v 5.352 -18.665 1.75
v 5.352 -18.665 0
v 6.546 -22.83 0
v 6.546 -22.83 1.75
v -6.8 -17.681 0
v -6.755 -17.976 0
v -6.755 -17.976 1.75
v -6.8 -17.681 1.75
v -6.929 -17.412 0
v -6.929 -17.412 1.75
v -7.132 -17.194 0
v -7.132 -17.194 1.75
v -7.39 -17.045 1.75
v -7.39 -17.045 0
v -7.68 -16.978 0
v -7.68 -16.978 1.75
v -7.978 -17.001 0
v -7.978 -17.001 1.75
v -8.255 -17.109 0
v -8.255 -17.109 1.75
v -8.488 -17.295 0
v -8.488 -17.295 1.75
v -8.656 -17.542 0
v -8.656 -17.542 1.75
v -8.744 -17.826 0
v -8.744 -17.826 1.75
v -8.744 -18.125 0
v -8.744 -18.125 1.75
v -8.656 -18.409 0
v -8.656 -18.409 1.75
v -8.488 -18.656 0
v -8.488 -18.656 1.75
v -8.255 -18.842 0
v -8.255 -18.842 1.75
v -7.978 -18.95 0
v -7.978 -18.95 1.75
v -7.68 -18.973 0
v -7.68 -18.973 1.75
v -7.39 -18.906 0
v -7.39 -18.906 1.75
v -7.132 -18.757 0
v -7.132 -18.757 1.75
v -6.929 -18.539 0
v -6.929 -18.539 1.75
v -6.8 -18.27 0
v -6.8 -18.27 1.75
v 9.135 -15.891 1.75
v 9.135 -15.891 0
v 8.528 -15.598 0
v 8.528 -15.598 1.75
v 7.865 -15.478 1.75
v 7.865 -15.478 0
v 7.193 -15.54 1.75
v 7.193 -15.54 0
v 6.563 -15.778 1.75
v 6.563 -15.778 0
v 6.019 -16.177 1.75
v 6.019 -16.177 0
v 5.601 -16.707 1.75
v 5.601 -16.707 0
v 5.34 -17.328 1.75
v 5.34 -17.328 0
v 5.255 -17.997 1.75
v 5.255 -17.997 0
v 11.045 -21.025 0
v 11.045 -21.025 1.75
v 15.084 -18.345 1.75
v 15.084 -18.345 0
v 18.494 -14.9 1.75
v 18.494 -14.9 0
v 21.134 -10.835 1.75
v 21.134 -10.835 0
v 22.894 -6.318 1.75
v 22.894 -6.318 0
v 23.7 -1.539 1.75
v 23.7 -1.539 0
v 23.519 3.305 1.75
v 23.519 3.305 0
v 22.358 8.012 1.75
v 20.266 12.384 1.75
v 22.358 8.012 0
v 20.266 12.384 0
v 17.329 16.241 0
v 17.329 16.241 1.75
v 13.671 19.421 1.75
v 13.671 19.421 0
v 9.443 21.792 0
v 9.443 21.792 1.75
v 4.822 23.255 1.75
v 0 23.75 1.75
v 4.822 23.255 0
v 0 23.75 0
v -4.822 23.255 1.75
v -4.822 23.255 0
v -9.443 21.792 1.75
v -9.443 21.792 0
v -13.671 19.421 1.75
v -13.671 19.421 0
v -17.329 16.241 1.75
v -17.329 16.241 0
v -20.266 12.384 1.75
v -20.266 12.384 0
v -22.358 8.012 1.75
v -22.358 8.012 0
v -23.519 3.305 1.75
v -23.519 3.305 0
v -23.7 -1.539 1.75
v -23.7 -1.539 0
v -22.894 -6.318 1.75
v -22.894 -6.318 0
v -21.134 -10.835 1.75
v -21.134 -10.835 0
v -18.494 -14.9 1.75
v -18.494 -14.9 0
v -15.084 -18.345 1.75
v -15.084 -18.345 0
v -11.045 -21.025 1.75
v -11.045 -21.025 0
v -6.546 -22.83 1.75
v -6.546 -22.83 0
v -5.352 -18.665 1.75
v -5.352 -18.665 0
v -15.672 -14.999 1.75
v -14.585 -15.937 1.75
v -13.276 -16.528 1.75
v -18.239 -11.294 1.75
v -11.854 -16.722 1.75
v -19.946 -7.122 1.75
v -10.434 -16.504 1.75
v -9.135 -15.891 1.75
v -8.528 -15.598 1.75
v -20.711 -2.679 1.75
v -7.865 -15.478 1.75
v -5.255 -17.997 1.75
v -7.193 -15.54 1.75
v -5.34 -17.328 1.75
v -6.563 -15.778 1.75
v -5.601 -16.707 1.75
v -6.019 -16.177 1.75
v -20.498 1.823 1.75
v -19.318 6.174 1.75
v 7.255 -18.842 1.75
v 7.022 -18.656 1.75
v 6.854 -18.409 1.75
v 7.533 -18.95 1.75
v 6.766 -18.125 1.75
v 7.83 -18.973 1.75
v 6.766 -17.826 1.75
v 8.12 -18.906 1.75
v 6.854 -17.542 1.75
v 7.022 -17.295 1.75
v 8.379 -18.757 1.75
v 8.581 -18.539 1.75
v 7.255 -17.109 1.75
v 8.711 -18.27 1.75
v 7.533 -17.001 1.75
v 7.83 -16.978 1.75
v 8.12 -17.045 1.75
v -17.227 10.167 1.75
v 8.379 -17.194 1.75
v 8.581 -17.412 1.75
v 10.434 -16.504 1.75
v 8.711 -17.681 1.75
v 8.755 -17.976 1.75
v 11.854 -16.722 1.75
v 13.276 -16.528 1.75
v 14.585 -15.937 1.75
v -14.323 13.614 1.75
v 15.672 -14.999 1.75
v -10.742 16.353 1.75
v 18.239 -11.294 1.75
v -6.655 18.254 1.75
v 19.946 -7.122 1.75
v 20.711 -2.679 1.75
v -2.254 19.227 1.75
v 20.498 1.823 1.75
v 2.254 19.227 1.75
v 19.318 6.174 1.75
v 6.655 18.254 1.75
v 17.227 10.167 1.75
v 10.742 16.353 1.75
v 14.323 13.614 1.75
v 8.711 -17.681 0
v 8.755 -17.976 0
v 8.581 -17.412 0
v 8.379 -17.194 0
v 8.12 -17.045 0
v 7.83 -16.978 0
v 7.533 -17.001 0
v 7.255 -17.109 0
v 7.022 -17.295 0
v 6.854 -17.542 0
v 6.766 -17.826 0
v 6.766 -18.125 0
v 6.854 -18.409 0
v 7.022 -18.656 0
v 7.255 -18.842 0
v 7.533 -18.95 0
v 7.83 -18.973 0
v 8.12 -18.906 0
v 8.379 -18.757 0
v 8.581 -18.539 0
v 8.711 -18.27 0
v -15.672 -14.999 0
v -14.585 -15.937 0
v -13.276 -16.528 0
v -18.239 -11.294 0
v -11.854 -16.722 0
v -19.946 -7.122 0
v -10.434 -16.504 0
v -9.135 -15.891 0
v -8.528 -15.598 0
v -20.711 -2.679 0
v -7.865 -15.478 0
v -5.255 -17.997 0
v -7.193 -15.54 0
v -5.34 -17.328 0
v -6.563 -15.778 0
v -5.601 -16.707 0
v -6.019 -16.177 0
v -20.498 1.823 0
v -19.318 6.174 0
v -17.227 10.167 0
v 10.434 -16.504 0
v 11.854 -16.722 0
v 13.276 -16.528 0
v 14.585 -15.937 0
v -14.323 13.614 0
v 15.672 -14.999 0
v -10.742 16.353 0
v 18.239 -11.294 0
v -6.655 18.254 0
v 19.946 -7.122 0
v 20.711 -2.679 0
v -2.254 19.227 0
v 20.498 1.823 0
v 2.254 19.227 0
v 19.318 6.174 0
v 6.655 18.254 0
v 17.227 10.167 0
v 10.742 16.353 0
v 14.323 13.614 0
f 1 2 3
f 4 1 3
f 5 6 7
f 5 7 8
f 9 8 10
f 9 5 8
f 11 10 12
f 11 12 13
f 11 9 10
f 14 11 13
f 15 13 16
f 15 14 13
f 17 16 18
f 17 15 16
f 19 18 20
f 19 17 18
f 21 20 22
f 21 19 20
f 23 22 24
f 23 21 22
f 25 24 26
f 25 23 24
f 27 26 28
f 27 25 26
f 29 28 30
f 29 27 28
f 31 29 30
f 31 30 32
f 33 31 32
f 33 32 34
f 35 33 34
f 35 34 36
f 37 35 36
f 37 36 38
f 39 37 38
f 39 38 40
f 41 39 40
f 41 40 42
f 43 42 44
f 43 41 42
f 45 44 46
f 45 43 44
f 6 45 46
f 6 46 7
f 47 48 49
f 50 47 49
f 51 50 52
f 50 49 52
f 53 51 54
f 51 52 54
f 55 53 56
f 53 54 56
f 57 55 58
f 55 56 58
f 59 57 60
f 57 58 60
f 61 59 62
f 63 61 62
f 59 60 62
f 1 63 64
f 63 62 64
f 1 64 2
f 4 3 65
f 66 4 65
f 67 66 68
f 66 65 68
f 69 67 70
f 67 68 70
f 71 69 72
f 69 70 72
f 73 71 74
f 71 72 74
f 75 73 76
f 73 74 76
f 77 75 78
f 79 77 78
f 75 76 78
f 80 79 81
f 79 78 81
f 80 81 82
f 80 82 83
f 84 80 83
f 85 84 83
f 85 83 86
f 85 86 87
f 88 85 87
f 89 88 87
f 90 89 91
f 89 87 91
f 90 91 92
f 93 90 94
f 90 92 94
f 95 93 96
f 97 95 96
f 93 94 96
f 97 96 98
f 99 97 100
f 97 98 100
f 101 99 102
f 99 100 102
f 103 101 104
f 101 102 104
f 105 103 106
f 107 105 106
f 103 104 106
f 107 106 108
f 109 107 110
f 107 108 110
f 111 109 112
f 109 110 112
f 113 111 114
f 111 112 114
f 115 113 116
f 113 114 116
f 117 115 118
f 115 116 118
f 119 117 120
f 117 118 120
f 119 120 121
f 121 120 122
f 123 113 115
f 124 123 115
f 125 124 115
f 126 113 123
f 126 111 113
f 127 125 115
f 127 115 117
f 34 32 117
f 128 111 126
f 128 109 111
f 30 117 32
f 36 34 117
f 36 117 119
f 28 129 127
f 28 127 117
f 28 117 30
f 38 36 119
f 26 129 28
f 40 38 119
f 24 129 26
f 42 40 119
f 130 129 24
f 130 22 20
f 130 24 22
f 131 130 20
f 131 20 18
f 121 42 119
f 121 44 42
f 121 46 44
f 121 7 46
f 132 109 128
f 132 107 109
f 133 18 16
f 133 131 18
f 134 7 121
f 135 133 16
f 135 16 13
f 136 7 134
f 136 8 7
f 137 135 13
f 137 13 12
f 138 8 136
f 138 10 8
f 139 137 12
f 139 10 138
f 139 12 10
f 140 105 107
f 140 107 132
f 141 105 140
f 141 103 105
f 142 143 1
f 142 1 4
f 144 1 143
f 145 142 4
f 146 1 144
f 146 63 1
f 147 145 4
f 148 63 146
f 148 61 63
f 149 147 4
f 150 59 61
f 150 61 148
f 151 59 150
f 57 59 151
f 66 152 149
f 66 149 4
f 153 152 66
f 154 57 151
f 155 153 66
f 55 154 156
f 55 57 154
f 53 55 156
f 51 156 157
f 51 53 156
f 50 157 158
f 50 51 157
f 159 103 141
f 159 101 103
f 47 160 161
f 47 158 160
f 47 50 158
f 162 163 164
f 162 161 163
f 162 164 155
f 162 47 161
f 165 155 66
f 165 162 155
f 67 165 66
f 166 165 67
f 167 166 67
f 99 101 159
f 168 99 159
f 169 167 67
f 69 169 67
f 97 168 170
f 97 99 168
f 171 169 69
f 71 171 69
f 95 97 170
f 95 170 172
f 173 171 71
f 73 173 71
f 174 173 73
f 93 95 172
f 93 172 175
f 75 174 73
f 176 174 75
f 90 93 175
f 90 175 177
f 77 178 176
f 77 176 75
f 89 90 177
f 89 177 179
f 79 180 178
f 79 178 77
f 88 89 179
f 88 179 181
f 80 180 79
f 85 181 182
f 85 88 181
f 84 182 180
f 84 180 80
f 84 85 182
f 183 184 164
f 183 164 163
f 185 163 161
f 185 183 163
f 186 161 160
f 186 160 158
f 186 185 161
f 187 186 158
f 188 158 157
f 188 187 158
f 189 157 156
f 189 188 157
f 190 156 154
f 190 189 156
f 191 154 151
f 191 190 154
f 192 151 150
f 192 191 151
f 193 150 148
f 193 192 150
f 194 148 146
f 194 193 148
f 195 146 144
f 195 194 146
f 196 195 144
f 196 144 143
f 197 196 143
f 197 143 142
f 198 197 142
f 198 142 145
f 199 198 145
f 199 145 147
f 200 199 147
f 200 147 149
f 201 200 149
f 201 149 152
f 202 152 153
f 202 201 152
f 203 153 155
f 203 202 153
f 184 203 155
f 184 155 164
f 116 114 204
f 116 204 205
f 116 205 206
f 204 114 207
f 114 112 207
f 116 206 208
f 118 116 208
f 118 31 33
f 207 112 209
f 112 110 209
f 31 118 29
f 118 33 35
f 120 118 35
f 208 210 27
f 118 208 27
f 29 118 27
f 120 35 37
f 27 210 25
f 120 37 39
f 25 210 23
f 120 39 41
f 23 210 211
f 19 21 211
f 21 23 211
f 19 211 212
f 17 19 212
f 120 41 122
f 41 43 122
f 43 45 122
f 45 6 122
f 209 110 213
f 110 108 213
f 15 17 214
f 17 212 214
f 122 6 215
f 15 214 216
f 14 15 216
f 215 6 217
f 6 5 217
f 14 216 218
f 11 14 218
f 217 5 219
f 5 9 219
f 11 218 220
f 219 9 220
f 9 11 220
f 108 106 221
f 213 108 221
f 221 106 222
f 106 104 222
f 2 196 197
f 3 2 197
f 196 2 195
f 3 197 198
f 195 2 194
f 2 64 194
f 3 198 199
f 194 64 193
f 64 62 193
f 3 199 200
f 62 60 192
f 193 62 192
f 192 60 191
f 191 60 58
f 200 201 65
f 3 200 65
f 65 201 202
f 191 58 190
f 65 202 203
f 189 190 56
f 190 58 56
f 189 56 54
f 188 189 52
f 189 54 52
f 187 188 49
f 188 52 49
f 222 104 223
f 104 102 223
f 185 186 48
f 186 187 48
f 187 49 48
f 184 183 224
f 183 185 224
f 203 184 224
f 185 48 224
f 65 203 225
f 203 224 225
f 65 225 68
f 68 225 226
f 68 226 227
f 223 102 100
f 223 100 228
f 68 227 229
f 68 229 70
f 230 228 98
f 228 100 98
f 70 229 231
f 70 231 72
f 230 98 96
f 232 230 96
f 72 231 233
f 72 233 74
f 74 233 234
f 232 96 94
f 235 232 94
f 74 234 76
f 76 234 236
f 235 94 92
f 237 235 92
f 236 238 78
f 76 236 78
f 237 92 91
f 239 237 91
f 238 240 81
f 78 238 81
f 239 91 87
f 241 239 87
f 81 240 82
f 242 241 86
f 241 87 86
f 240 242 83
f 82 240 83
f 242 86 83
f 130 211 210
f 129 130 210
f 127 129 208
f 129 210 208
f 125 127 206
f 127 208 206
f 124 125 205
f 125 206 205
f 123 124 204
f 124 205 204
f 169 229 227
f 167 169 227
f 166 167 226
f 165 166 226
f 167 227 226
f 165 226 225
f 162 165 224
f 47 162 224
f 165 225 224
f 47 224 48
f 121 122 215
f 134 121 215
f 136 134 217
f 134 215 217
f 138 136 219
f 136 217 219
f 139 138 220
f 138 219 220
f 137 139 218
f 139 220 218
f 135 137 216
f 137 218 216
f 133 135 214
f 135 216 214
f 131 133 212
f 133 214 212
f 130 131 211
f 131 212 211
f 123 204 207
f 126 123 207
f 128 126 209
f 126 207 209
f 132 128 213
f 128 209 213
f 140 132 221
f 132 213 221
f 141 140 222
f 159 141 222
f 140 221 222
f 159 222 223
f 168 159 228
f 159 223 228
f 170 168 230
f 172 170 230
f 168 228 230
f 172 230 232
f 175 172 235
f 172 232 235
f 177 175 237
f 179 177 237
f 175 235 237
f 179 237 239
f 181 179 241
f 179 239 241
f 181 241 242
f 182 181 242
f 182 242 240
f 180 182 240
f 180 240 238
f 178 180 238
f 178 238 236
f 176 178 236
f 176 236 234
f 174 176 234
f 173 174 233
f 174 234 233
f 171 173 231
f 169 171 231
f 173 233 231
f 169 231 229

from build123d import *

# Parameters (mm, degrees)
SKETCH2_R           = 1
BOSS_EXTRUDE1_DEPTH = 1.75


with BuildPart() as part:
    # Sketch2 → Boss-Extrude1 (new body)
    with BuildSketch(Plane.XY):
        with BuildLine():
            ThreePointArc((-5.351990622, -18.664609398), (-6.277079647, -15.959251249), (-9.135419395, -15.891087439))
            ThreePointArc((-9.135419395, -15.891087439), (-12.571938491, -16.676326013), (-15.672466243, -14.999128717))
            ThreePointArc((-15.672466243, -14.999128717), (3.5e-08, 19.35), (15.672466197, -14.99912877))
            ThreePointArc((15.672466197, -14.99912877), (12.571938449, -16.676326019), (9.135419383, -15.891087431))
            ThreePointArc((9.135419383, -15.891087431), (6.277079669, -15.959251233), (5.351990603, -18.664609332))
            Line((5.351990603, -18.664609332), (6.546387201, -22.829965279))
            ThreePointArc((6.546387201, -22.829965279), (0, 23.75), (-6.546387201, -22.829965279))
            Line((-6.546387201, -22.829965279), (-5.351990622, -18.664609398))
        make_face()
        with Locations((-7.755144841, -17.975515935)):
            Circle(SKETCH2_R, mode=Mode.SUBTRACT)
        with Locations((7.755144841, -17.975515935)):
            Circle(SKETCH2_R, mode=Mode.SUBTRACT)
    extrude(amount=BOSS_EXTRUDE1_DEPTH)


solid = part.part
